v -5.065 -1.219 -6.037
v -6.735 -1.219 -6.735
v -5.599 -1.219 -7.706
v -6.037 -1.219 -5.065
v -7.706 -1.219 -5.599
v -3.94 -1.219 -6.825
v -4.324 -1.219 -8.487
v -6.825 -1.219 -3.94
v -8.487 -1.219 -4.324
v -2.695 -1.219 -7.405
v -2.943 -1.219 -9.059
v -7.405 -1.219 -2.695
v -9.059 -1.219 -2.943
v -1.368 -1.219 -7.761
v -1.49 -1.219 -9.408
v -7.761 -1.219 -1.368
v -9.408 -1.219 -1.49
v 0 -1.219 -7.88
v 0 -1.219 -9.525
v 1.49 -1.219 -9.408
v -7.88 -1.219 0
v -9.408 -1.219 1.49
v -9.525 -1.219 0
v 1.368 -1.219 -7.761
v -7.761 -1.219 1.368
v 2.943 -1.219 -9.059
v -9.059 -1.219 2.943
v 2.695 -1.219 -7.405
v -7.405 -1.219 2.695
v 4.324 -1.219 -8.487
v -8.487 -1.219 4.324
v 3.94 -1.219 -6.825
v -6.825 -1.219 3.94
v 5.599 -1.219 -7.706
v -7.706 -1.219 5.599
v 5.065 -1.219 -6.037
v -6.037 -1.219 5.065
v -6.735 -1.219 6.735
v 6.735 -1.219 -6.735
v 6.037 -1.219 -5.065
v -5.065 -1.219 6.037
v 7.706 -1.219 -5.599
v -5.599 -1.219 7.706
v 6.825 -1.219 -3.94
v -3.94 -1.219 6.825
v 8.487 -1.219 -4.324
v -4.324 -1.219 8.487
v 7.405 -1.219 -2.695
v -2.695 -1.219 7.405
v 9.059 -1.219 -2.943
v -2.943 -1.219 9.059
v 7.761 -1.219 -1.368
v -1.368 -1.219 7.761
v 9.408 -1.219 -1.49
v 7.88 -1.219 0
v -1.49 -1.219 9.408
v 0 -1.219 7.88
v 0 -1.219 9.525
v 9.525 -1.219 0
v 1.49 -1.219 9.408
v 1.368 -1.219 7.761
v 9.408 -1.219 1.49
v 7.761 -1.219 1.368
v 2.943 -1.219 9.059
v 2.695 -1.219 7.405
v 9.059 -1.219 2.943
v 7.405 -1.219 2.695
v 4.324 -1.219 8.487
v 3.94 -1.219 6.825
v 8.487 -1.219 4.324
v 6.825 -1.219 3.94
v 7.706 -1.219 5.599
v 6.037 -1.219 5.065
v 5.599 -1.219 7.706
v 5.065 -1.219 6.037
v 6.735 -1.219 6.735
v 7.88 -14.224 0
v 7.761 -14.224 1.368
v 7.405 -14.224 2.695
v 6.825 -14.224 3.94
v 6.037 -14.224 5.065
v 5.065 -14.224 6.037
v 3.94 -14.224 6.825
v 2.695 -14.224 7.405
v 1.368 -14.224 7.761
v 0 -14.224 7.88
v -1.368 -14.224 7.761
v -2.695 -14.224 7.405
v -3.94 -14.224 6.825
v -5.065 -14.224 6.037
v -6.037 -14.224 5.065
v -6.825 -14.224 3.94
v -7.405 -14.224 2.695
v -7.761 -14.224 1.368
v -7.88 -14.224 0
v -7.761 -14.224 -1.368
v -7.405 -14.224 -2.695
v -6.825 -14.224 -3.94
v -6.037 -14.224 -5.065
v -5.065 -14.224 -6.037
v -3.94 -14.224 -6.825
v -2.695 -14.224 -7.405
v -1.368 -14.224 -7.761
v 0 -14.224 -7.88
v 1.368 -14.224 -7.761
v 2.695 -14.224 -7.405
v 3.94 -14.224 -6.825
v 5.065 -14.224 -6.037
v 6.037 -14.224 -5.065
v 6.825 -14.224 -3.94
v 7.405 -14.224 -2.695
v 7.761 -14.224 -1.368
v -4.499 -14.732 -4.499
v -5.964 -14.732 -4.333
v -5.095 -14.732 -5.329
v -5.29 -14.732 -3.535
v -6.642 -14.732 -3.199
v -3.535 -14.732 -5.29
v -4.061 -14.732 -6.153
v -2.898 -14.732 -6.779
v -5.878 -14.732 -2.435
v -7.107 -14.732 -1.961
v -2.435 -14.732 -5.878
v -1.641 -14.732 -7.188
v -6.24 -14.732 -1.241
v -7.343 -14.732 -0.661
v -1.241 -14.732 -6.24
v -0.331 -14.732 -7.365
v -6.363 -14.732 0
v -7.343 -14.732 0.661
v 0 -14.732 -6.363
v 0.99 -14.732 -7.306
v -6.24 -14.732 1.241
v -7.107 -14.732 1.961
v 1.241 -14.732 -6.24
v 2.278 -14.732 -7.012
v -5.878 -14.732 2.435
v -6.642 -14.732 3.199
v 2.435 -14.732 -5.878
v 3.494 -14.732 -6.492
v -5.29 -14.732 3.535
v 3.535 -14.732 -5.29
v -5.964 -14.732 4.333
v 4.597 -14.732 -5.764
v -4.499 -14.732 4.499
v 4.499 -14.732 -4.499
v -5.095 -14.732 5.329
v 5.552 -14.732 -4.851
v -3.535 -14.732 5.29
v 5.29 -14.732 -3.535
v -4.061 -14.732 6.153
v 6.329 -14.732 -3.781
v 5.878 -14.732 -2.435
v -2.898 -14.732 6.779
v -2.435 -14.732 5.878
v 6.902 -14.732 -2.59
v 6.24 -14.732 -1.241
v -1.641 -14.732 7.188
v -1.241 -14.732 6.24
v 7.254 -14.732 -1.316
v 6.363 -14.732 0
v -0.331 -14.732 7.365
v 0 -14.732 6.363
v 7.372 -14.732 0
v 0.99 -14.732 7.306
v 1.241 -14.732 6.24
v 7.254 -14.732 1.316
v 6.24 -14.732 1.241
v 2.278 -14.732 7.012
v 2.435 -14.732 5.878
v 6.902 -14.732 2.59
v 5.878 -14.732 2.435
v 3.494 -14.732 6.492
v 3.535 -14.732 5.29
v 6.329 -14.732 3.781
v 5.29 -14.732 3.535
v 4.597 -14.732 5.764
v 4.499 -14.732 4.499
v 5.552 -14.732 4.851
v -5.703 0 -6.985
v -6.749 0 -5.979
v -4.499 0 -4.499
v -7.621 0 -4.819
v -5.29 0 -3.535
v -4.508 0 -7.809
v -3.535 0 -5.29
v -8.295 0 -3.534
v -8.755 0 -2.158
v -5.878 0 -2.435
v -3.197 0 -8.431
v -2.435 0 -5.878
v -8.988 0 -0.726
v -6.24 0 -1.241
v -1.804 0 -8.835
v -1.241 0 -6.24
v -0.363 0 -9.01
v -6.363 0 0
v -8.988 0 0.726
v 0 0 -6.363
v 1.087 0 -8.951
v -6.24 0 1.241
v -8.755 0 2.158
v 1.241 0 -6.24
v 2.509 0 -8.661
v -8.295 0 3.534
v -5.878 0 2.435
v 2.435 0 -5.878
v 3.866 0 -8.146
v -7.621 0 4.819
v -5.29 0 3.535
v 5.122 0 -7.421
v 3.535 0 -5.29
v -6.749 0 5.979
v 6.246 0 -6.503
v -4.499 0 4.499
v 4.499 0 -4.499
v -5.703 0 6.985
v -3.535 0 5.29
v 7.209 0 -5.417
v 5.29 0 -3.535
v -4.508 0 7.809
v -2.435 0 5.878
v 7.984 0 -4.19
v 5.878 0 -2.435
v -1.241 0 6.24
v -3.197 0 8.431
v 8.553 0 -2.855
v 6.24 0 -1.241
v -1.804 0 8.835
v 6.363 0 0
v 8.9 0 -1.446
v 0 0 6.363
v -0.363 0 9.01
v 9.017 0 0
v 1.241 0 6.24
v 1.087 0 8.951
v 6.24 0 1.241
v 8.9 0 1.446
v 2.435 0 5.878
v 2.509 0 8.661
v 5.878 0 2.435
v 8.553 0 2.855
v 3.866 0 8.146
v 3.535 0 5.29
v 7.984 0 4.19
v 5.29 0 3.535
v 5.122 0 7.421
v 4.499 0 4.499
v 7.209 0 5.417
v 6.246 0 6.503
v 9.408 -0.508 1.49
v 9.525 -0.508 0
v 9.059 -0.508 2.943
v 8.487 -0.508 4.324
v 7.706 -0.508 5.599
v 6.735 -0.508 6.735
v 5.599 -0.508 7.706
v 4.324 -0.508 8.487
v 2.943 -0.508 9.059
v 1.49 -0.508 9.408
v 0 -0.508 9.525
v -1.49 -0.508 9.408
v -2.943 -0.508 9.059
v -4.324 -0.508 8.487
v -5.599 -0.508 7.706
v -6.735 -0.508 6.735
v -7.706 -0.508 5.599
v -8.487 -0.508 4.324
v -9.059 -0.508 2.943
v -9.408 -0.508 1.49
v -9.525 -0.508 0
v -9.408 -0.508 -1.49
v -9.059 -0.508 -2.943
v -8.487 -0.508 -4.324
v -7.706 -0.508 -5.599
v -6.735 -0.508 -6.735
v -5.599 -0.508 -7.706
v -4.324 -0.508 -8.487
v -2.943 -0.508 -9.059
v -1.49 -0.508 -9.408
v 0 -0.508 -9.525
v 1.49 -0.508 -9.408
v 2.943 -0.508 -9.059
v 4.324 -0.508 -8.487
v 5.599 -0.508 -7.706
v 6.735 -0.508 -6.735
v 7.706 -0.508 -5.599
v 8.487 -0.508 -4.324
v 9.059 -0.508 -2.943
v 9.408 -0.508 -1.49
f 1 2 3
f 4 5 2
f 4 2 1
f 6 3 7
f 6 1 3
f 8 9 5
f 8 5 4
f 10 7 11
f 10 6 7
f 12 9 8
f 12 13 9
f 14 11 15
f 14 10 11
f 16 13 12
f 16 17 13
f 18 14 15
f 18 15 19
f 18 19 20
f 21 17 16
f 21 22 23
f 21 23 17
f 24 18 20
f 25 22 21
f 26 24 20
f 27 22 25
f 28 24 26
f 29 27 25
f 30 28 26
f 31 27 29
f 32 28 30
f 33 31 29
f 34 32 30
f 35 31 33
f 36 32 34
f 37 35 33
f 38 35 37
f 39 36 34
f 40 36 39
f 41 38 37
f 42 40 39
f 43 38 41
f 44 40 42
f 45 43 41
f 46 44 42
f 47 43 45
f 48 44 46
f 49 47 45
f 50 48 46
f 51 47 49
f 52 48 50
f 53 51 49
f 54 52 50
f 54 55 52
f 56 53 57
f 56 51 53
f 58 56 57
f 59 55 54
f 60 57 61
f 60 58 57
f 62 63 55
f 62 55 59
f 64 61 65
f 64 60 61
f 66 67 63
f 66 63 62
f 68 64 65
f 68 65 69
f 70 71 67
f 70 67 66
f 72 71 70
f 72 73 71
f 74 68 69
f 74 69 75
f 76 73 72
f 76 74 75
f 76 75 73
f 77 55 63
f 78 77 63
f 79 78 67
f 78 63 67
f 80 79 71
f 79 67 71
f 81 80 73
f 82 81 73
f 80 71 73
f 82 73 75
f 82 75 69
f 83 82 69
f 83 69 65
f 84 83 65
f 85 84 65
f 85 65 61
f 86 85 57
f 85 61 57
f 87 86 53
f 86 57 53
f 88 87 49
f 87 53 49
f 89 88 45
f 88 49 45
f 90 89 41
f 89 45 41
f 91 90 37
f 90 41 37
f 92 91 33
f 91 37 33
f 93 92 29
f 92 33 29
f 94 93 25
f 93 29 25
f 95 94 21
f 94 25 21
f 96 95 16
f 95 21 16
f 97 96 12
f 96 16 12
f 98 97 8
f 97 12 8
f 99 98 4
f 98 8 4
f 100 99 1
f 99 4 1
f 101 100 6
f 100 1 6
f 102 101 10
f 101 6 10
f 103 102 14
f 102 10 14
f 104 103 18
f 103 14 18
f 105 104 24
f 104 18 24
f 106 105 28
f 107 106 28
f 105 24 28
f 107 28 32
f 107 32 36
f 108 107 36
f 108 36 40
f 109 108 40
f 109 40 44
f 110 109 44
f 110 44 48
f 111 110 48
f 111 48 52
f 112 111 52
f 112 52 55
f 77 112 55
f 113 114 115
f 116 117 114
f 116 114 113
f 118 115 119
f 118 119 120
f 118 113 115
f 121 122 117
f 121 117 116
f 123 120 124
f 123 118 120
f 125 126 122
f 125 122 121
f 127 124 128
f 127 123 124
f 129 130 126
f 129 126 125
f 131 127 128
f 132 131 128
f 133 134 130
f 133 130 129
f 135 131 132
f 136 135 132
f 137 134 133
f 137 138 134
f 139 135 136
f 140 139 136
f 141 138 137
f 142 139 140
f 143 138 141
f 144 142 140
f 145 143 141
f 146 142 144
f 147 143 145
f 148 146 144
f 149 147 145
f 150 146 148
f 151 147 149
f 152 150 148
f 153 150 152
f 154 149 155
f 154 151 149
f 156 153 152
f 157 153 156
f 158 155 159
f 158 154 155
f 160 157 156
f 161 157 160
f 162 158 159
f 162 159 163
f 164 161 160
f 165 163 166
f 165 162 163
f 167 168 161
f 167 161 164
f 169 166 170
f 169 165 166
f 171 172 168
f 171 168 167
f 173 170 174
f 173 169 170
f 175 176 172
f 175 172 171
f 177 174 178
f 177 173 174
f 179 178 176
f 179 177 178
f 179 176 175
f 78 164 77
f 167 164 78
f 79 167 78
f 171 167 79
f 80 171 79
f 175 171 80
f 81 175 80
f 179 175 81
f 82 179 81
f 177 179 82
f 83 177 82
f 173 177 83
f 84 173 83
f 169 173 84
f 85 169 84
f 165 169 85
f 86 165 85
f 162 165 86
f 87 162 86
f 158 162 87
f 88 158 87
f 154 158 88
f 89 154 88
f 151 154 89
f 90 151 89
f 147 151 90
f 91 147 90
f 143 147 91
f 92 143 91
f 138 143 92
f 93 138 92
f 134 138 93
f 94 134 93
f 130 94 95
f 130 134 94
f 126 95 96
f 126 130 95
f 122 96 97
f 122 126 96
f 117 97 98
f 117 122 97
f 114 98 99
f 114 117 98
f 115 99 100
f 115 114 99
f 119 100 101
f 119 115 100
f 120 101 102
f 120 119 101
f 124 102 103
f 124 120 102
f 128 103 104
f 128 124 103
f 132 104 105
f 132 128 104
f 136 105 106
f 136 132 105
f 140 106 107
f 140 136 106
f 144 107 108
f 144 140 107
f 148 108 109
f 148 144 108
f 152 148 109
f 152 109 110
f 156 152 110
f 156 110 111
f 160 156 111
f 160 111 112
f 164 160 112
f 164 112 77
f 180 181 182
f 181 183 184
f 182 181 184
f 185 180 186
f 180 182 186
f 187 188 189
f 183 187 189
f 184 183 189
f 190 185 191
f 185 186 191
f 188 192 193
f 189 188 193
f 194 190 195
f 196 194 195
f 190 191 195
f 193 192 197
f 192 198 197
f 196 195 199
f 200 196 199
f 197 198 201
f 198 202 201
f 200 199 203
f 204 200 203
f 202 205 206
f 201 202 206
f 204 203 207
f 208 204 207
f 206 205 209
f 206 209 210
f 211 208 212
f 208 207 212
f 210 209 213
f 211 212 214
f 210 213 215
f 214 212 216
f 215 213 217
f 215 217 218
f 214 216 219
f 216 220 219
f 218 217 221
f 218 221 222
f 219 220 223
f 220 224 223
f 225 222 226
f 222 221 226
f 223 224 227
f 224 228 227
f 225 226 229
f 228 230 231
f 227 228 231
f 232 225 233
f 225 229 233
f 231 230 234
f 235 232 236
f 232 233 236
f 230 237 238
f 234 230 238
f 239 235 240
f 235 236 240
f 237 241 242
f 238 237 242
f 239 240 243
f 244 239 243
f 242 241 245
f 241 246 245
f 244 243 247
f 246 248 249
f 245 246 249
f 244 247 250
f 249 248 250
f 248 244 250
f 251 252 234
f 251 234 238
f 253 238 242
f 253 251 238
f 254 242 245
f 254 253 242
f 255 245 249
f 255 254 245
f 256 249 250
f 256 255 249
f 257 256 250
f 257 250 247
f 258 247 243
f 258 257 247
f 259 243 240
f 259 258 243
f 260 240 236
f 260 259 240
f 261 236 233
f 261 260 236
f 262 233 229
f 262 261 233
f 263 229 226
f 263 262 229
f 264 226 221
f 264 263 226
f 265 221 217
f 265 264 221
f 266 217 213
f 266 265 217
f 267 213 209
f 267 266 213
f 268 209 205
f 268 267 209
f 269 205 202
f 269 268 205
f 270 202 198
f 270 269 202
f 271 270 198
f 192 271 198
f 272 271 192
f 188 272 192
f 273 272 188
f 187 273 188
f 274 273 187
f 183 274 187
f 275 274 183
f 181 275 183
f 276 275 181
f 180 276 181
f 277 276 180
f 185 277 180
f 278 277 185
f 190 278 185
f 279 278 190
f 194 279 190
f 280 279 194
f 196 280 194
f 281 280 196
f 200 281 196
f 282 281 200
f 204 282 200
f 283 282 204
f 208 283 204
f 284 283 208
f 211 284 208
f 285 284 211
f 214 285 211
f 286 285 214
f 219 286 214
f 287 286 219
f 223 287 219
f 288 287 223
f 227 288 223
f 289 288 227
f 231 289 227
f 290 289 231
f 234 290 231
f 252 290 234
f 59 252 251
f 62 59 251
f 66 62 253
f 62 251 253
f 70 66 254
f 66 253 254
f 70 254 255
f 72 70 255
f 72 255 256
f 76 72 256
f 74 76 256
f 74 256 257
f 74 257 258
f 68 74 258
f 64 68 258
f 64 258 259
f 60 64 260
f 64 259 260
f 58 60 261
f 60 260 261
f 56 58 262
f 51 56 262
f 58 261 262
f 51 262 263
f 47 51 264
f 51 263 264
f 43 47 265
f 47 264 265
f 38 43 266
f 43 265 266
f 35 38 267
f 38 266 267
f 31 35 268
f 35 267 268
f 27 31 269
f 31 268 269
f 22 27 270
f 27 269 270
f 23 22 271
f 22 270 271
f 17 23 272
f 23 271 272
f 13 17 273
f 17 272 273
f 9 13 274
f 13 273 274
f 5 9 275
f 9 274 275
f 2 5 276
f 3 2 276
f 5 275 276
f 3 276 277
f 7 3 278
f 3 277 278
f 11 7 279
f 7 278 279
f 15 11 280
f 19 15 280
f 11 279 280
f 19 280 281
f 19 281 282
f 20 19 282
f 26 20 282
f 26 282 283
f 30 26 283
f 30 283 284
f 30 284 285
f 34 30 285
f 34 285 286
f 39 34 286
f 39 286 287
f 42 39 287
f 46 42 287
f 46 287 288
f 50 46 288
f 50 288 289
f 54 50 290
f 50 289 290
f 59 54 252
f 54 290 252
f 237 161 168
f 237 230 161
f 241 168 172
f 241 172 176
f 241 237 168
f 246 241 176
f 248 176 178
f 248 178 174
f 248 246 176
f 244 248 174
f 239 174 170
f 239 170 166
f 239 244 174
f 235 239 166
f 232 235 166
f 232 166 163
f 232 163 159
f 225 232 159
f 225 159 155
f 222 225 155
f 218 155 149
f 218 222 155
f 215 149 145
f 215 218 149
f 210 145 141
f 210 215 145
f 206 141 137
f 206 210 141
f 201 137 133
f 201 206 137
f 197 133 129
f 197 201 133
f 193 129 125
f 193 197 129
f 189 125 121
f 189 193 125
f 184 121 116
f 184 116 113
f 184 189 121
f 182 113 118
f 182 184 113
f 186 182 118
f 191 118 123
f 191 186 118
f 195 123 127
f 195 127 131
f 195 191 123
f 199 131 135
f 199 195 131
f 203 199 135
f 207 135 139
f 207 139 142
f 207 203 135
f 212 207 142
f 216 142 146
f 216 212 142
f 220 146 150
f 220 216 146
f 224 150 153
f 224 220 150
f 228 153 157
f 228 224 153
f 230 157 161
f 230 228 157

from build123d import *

# Parameters (mm, degrees)
F0_R     = 9.525
F0_R_2   = 6.3627
F1_DEPTH = 1.2192
F2_R     = 7.88035
F2_R_2   = 6.3627
F3_DEPTH = 13.5128
F4_SIZE2 = 0.508
F4_SIZE  = 0.508


with BuildPart() as f1:
    # F0 (on Front) → F1 (new body)
    with BuildSketch(Plane.XZ):
        Circle(F0_R)
        Circle(F0_R_2, mode=Mode.SUBTRACT)
    extrude(amount=F1_DEPTH)

    # F2 (on face) → F3 (join)
    with BuildSketch(Plane.XZ.offset(1.2192)):
        Circle(F2_R)
        Circle(F2_R_2, mode=Mode.SUBTRACT)
    extrude(amount=F3_DEPTH)

    # F4
    f4_edges = [f1.edges().sort_by_distance(p)[0] for p in [
        (-9.525, 0, 0),
        (-7.88035, -14.732, 0),
    ]]
    chamfer(f4_edges, length=F4_SIZE, length2=F4_SIZE2)


solid = f1.part
